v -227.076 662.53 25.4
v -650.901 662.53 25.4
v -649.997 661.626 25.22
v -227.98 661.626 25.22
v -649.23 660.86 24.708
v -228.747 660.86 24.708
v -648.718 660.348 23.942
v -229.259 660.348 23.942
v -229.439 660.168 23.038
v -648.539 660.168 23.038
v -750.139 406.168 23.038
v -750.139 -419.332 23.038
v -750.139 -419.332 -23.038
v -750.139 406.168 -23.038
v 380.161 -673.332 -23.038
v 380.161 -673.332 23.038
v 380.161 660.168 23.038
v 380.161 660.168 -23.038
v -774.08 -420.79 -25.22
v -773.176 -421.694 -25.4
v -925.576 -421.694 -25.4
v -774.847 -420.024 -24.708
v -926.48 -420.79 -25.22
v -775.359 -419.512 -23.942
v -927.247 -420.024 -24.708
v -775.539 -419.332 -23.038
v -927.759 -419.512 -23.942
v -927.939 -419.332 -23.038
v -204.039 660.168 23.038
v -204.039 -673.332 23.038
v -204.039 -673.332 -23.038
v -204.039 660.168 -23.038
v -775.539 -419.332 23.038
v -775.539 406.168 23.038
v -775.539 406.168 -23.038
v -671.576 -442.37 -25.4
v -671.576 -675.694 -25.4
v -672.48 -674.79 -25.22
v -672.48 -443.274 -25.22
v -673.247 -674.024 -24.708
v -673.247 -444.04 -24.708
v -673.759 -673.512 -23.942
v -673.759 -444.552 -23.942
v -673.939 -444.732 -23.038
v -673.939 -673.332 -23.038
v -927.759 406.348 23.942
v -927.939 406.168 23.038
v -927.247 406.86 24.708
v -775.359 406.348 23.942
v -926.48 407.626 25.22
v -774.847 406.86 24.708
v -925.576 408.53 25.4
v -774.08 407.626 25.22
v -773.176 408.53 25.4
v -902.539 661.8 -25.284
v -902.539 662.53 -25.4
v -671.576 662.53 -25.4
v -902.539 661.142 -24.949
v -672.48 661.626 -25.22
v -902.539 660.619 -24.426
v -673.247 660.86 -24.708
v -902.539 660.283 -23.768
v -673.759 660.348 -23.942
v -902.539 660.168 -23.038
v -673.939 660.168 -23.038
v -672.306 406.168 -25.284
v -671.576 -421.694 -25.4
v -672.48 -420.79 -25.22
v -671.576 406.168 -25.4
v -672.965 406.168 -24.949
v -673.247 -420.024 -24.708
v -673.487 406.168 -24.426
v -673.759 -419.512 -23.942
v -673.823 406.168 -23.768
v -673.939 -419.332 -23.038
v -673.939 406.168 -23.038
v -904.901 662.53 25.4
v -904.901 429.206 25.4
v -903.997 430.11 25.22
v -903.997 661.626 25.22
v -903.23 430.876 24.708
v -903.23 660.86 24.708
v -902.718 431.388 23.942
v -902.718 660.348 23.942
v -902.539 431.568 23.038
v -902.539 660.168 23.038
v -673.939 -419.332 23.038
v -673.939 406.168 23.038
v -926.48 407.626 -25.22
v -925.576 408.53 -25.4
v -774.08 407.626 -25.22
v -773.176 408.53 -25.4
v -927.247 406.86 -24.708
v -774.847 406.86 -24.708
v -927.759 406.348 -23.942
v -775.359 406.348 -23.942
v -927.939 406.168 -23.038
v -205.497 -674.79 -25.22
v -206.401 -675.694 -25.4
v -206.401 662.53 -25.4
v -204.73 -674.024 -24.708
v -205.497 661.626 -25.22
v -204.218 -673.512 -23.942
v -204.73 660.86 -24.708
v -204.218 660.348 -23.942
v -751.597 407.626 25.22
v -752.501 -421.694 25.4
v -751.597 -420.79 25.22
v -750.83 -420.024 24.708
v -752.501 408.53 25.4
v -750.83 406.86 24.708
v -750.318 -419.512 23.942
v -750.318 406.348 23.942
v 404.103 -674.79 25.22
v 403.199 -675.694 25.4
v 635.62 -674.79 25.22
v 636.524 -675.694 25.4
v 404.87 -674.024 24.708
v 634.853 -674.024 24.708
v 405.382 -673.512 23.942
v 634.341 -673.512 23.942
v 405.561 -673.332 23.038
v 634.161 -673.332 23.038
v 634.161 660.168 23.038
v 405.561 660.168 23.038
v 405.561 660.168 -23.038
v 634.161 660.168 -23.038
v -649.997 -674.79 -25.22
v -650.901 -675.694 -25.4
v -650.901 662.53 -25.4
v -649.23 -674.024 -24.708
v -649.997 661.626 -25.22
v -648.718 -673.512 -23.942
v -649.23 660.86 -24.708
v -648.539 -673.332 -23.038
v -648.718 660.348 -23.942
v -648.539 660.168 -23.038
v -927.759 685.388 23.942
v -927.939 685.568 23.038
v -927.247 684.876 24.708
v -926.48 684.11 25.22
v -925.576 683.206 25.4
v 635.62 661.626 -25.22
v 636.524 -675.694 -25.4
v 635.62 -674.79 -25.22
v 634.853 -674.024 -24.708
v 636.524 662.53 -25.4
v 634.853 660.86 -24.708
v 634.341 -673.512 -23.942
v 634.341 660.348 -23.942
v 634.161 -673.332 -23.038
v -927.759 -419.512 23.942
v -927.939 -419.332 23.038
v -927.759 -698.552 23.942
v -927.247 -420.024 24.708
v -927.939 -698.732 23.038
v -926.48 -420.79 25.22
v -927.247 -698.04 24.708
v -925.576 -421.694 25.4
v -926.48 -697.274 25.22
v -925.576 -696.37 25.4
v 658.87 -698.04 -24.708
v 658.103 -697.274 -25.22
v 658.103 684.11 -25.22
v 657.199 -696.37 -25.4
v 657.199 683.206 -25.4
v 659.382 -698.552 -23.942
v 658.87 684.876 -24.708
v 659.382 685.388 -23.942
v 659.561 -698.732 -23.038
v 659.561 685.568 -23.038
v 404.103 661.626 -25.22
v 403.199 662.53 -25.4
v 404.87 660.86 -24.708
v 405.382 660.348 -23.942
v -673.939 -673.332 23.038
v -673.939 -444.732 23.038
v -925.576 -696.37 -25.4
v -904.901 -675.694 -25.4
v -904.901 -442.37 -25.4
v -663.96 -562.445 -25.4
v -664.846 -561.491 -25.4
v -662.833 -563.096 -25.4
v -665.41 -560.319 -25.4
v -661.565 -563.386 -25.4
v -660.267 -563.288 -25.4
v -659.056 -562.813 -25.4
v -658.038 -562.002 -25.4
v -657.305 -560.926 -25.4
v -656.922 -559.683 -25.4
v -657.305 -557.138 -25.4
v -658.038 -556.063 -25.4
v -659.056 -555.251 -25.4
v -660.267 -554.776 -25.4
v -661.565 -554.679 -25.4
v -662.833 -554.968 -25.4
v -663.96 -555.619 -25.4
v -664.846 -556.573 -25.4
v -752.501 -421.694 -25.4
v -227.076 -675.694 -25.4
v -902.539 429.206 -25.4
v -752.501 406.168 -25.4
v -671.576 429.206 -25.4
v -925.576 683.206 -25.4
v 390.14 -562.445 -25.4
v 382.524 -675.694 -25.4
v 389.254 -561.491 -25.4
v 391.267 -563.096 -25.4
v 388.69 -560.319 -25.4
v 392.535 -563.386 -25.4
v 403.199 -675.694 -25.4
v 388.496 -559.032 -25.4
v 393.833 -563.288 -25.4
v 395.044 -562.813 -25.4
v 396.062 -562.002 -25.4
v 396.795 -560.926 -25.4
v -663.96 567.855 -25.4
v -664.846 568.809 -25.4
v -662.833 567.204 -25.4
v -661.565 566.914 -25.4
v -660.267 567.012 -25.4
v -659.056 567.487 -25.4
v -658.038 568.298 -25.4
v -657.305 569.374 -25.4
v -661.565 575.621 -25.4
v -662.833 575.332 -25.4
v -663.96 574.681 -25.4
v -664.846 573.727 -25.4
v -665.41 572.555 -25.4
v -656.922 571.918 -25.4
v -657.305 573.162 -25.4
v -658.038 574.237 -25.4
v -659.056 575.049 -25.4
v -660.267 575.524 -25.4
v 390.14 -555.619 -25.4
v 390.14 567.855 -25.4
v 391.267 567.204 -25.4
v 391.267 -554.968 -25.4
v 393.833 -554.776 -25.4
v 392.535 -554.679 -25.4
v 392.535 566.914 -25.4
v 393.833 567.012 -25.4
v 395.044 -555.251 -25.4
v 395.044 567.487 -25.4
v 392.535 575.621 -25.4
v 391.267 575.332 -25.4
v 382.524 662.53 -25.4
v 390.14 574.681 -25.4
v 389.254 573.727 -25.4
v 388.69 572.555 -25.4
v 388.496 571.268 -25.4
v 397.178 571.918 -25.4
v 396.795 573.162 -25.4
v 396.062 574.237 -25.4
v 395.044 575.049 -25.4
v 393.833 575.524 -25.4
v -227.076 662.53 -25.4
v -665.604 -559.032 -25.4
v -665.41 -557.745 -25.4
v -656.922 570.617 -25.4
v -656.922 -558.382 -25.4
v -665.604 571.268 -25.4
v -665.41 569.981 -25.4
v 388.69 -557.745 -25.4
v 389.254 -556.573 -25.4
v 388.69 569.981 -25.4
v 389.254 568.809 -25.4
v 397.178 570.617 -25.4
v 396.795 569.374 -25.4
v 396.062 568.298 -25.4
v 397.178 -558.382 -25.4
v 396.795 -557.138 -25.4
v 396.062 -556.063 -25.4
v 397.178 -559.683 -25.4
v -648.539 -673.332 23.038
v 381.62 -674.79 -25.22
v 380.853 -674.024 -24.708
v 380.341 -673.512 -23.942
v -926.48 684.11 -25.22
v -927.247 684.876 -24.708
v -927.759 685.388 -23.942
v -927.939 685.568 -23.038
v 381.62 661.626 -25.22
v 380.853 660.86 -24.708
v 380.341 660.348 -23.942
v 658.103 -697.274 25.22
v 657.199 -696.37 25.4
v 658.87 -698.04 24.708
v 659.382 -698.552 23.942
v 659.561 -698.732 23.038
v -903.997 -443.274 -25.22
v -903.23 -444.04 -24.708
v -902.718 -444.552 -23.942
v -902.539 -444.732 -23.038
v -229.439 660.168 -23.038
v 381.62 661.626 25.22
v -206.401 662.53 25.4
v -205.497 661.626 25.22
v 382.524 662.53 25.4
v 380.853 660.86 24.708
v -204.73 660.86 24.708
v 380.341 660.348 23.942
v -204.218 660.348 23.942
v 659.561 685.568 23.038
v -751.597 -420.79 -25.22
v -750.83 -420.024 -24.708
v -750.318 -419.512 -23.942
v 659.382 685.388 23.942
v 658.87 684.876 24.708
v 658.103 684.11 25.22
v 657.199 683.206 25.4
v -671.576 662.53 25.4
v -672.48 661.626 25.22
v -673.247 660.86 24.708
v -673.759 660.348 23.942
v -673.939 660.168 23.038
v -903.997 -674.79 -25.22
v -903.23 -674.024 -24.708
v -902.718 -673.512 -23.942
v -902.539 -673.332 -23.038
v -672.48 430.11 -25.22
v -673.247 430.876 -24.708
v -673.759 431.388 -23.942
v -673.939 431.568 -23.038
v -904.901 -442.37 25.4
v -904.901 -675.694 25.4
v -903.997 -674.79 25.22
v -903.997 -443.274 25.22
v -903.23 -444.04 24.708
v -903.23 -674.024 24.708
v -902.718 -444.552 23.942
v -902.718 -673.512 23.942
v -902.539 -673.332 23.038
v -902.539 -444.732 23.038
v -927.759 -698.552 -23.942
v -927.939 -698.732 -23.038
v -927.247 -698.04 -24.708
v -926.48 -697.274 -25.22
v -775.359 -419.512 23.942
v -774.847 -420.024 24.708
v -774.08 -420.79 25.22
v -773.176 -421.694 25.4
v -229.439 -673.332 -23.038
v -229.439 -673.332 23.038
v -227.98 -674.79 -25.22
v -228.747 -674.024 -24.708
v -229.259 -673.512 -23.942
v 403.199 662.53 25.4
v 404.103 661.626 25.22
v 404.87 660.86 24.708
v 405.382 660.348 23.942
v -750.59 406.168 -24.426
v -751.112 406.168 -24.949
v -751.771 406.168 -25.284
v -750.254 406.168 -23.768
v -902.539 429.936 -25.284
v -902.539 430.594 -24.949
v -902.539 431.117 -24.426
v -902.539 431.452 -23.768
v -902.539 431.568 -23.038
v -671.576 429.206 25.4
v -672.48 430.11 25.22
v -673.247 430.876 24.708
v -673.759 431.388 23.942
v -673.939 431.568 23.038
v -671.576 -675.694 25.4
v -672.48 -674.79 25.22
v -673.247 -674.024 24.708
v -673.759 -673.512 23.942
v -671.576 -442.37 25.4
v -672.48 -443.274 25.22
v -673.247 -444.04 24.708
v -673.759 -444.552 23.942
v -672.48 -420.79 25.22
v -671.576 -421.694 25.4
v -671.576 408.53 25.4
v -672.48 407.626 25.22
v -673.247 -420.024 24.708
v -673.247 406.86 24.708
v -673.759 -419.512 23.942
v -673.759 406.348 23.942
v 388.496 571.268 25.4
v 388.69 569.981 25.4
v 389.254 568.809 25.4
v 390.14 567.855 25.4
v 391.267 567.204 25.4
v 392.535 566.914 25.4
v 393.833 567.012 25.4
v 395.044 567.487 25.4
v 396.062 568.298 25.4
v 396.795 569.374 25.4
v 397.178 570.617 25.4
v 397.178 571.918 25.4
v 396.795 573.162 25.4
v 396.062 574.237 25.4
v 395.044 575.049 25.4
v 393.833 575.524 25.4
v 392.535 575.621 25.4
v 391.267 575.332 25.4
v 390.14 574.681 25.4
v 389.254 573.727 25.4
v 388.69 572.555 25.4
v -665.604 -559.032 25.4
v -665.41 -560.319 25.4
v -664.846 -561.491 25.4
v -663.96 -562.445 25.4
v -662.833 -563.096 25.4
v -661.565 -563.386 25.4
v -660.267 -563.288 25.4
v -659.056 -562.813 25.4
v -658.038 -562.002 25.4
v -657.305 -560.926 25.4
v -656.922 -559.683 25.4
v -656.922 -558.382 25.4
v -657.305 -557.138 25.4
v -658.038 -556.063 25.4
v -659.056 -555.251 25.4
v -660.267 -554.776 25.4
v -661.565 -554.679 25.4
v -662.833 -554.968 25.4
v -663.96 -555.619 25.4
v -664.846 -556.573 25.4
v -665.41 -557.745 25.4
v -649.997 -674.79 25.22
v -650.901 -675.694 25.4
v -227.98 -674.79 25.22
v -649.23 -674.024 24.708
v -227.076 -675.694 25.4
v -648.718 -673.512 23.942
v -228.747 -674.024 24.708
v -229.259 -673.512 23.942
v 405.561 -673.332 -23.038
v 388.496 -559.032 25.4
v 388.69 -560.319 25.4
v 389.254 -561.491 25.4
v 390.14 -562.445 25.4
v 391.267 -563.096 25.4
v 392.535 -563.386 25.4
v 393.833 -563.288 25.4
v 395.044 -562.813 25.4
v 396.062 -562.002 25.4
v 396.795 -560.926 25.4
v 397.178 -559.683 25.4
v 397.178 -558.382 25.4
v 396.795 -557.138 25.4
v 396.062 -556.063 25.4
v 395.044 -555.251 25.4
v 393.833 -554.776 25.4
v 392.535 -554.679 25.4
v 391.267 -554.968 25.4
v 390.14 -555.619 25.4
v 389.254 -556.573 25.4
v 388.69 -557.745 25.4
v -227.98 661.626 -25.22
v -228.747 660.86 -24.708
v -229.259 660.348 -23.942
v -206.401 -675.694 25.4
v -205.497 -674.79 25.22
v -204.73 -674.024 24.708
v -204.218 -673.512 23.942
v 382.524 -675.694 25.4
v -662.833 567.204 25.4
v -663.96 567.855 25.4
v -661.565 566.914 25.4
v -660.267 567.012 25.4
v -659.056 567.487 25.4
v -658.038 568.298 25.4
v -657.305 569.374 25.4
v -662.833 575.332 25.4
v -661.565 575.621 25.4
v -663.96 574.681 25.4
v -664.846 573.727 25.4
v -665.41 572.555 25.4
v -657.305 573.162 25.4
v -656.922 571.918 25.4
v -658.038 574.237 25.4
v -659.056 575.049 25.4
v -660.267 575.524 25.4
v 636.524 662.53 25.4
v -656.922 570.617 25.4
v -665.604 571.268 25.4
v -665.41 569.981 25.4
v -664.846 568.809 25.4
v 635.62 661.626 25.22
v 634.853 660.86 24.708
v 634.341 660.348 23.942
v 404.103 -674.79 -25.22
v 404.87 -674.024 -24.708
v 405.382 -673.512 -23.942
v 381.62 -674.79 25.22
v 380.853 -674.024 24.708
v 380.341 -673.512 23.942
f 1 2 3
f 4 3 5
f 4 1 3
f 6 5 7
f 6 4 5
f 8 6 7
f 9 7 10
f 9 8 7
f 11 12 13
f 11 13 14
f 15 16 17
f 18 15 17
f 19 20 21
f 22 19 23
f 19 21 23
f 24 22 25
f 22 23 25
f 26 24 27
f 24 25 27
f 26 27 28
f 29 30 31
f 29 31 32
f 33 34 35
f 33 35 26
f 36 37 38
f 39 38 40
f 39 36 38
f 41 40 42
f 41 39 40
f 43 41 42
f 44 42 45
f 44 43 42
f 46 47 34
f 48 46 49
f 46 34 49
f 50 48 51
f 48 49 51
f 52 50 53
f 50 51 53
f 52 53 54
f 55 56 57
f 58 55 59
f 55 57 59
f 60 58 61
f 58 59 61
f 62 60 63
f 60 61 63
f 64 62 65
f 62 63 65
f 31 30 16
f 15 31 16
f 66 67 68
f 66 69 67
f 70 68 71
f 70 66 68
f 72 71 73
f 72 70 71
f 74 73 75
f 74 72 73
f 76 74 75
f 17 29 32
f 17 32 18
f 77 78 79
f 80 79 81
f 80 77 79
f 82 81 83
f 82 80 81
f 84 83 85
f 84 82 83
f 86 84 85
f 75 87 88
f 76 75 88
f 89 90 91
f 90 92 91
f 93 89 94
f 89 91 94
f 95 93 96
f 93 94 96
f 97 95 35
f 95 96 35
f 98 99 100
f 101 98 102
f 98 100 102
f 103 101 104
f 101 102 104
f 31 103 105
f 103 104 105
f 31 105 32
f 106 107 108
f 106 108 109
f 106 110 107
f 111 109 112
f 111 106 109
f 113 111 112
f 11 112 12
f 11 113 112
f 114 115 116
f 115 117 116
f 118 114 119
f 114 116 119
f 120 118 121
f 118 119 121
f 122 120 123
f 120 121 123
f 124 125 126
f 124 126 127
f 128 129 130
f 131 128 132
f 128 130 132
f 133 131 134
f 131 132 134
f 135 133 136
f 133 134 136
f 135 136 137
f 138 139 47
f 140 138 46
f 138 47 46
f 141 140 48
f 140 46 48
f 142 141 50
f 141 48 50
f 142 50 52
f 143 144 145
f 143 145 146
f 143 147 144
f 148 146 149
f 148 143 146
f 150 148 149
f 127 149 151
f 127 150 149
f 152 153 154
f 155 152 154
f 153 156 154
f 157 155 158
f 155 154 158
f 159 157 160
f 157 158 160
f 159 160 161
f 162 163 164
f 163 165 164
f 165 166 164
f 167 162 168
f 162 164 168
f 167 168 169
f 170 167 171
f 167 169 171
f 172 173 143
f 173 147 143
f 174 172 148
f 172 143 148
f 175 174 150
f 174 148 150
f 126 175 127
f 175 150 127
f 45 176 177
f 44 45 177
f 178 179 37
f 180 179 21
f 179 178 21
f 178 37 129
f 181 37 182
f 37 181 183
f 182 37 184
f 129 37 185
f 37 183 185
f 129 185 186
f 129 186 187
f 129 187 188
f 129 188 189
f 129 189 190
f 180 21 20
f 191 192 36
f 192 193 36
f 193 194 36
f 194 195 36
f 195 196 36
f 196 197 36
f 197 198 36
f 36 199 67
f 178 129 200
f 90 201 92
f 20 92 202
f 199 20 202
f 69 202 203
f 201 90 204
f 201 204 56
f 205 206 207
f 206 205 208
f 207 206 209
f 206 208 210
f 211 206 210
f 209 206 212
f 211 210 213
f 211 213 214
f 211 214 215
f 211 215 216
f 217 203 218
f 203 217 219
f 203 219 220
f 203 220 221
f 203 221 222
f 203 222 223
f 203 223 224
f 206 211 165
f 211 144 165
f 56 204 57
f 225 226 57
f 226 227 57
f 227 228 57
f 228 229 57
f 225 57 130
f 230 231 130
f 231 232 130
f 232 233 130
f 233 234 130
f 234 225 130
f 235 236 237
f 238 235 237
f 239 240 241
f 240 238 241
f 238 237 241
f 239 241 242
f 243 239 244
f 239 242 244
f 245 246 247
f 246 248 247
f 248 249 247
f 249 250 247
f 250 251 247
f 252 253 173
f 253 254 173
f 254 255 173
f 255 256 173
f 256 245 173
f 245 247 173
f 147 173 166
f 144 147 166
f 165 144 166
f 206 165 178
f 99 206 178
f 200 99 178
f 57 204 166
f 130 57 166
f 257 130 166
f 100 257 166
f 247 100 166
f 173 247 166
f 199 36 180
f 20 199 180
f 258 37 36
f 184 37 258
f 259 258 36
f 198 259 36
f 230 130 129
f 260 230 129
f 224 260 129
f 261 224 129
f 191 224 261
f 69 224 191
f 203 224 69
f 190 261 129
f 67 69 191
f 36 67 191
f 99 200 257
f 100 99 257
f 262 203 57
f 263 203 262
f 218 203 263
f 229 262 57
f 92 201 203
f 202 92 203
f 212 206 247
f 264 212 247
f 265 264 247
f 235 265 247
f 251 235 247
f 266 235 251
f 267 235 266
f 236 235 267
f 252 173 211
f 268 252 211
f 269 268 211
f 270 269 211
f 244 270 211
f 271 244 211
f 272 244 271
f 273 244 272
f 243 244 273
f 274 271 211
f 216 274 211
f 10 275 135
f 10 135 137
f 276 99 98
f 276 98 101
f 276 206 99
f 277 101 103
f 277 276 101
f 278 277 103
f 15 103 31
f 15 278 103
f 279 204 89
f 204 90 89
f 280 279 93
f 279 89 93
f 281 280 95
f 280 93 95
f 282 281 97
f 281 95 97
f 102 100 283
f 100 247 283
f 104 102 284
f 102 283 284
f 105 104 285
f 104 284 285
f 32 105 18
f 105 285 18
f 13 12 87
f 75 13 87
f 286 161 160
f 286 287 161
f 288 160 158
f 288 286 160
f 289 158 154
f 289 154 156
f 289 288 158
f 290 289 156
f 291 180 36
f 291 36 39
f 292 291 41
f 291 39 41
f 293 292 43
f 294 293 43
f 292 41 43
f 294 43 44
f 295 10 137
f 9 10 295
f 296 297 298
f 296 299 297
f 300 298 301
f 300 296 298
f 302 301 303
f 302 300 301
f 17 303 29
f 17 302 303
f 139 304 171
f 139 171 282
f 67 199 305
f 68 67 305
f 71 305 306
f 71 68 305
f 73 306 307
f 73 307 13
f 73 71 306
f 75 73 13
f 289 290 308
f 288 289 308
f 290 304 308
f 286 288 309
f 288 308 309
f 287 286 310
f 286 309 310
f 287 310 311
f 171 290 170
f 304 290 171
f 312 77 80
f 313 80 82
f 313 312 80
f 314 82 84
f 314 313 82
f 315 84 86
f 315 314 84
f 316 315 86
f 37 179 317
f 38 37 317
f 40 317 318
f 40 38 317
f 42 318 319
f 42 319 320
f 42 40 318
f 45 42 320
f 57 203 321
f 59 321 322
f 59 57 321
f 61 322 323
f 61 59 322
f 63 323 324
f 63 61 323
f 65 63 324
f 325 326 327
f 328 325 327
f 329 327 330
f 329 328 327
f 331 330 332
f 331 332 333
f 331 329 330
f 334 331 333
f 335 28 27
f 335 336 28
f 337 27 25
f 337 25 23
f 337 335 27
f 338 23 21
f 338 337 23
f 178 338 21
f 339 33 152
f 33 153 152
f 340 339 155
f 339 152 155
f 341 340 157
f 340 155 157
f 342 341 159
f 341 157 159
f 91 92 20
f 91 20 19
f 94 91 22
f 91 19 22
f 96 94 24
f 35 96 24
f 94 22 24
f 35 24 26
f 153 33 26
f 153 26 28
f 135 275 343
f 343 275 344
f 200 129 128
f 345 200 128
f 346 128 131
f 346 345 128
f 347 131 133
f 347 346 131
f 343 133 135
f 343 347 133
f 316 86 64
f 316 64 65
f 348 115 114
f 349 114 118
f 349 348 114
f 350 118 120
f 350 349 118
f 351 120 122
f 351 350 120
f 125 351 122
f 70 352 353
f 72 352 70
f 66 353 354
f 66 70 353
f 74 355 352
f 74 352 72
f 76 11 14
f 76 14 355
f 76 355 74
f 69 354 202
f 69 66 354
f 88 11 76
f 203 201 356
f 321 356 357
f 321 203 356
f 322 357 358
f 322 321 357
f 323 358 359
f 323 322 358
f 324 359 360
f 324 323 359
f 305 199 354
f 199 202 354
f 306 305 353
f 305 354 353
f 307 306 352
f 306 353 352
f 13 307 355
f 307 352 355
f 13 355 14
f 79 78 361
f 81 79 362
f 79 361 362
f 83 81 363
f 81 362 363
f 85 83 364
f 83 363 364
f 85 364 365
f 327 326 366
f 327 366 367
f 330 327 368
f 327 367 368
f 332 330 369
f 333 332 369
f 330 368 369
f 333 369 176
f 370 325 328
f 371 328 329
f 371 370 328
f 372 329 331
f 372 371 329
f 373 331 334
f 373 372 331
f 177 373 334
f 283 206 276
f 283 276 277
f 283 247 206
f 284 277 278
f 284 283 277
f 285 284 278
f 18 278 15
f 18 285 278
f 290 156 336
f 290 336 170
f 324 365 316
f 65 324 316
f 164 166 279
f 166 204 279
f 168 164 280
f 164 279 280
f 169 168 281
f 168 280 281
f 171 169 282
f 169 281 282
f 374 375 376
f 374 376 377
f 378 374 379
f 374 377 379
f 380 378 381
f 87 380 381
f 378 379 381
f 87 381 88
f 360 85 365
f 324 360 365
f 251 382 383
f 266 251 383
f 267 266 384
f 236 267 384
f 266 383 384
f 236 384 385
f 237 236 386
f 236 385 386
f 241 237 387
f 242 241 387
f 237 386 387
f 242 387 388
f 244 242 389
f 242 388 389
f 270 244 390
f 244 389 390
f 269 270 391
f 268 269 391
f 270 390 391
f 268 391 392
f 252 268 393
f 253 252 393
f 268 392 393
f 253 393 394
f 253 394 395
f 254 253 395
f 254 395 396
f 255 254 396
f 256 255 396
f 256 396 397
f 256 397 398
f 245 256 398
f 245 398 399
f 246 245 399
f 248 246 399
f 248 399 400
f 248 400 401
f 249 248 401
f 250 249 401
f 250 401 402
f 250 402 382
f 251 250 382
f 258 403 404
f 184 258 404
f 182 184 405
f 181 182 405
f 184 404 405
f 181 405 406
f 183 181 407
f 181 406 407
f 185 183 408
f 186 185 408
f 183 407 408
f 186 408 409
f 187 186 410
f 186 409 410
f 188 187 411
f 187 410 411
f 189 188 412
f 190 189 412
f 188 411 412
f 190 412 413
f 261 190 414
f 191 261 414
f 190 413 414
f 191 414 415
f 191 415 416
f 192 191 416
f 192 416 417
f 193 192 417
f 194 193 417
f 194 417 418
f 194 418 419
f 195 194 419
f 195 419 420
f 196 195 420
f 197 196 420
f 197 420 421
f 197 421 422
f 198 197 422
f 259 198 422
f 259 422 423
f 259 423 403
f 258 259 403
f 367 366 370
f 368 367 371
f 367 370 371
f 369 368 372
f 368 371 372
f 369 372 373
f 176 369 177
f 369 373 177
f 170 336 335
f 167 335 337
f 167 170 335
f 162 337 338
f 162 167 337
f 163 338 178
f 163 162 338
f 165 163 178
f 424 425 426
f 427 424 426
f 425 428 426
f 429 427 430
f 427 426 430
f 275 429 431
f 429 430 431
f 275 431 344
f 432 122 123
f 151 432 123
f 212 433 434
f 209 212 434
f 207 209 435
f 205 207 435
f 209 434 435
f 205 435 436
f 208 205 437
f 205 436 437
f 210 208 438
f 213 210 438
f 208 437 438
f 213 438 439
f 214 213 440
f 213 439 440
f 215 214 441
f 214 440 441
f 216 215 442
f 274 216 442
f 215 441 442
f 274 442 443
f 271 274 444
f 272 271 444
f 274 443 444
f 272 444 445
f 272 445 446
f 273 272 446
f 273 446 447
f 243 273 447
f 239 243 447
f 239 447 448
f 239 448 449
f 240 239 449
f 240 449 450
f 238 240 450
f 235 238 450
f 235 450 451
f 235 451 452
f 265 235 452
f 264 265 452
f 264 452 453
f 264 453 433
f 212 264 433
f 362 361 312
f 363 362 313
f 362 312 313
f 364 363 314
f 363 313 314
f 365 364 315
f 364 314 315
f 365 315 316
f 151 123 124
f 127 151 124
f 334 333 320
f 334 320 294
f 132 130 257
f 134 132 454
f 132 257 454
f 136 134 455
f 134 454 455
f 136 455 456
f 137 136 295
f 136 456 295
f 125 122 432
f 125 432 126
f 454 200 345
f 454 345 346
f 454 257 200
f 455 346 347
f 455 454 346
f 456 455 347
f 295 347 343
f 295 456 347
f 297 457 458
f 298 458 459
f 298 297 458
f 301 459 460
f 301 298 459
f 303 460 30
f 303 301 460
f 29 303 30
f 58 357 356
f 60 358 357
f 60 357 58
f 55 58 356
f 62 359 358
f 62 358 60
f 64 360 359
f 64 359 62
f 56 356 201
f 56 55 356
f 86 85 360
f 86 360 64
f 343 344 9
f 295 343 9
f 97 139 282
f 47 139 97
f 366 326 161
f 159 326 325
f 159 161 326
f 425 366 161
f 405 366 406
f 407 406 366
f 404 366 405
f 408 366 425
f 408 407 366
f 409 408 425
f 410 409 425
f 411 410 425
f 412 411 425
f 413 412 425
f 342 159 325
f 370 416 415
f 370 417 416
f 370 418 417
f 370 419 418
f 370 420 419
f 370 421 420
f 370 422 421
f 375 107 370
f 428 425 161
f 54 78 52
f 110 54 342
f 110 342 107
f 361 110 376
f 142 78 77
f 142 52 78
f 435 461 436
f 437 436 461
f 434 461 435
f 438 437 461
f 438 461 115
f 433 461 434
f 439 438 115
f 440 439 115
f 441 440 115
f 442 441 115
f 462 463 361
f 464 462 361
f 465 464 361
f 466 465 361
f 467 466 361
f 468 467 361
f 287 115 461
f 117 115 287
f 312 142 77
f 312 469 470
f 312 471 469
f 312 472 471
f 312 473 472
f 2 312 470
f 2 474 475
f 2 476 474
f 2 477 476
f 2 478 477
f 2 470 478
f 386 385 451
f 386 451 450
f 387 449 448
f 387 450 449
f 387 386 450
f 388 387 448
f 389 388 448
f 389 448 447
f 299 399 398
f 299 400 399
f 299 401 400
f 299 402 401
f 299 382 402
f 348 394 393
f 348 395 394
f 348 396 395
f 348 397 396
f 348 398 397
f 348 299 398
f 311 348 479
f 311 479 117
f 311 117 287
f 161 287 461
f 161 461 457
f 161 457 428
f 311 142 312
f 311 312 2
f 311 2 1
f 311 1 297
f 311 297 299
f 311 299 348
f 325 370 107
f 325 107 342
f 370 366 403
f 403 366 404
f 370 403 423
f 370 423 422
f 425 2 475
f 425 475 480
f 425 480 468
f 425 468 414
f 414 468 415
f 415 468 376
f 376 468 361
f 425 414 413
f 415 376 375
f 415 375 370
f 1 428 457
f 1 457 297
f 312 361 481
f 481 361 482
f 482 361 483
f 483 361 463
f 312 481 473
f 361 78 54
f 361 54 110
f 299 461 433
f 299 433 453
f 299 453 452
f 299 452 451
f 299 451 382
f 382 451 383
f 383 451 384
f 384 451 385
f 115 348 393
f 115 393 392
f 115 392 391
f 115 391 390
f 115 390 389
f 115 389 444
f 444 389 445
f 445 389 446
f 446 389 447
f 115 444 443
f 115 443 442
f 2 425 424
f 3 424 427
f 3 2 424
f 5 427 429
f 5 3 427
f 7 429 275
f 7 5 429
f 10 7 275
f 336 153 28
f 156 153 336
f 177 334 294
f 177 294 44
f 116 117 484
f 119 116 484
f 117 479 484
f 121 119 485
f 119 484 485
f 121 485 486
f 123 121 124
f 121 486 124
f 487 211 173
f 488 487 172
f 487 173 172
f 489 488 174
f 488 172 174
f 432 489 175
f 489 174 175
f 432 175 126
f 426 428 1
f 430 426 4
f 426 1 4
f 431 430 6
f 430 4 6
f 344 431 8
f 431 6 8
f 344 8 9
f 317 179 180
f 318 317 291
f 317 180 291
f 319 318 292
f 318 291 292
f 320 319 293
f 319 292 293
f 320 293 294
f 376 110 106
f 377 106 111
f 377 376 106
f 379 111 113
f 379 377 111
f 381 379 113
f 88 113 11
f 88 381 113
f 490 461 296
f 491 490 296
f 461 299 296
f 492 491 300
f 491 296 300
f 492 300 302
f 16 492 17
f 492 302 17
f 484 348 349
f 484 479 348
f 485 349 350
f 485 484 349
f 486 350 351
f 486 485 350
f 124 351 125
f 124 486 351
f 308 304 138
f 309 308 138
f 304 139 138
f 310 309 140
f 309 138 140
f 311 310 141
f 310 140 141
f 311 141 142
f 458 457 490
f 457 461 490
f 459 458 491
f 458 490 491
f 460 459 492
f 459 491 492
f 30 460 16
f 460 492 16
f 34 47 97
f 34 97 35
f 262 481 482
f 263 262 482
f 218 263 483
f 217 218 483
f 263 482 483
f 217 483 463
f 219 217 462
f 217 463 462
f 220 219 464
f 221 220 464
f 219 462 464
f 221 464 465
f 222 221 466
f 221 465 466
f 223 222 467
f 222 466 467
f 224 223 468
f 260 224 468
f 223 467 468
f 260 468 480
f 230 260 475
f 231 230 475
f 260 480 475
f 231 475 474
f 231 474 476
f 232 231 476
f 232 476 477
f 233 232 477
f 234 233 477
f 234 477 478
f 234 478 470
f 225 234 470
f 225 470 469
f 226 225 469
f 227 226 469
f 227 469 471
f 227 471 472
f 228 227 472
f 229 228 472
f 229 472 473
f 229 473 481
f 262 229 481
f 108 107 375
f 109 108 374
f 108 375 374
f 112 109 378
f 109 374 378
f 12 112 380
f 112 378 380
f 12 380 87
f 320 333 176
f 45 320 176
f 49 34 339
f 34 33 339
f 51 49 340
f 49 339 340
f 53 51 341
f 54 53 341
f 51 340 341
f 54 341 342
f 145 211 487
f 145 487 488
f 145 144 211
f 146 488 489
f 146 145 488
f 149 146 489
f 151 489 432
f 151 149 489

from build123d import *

# Parameters (mm, degrees)
F0_W     = 228.6
F0_H     = 228.6
F0_W_2   = 76.2
F0_H_2   = 825.5
F0_W_3   = 419.1
F0_H_3   = 1333.5
F0_W_4   = 584.2
F1_DEPTH = 25.4
F2_R     = 2.3622
F3_R     = 2.3622
F5_D     = 8.73125


with BuildPart() as f1:
    # F0 (on Top) → F1 (new body, symmetric)
    with BuildSketch(Plane.XY):
        Polygon((-927.9385305348, -419.3321948051), (-927.9385305348, -698.7321948051), (659.5614694652, -698.7321948051), (659.5614694652, 685.5678051949), (-927.9385305348, 685.5678051949), (-927.9385305348, 406.1678051949), (-775.5385305348, 406.1678051949), (-775.5385305348, -419.3321948051), align=None)
        with Locations((-788.2385305348, -559.0321948051)):
            Rectangle(F0_W, F0_H, mode=Mode.SUBTRACT)
        with Locations((-712.0385305348, -6.5821948051)):
            Rectangle(F0_W_2, F0_H_2, mode=Mode.SUBTRACT)
        with Locations((-438.9885305348, -6.5821948051)):
            Rectangle(F0_W_3, F0_H_3, mode=Mode.SUBTRACT)
        with Locations((-788.2385305348, 545.8678051949)):
            Rectangle(F0_W, F0_H, mode=Mode.SUBTRACT)
        with Locations((88.0614694652, -6.5821948051)):
            Rectangle(F0_W_4, F0_H_3, mode=Mode.SUBTRACT)
        with Locations((519.8614694652, -6.5821948051)):
            Rectangle(F0_W, F0_H_3, mode=Mode.SUBTRACT)
    extrude(amount=F1_DEPTH, both=True)

    # F2
    f2_edges = [f1.edges().sort_by_distance(p)[0] for p in [
        (-927.938531, 545.867805, 25.4),
        (-851.738531, 406.167805, 25.4),
        (-775.538531, -6.582195, 25.4),
        (-134.188531, 685.567805, 25.4),
        (659.561469, -6.582195, 25.4),
        (-134.188531, -698.732195, 25.4),
        (-927.938531, -559.032195, 25.4),
        (-851.738531, -419.332195, 25.4),
        (-712.038531, -419.332195, 25.4),
        (-750.138531, -6.582195, 25.4),
        (-788.238531, -444.732195, 25.4),
        (-673.938531, -559.032195, 25.4),
        (-902.538531, -559.032195, 25.4),
        (-788.238531, -673.332195, 25.4),
        (-438.988531, -673.332195, 25.4),
        (-648.538531, -6.582195, 25.4),
        (-229.438531, -6.582195, 25.4),
        (88.061469, -673.332195, 25.4),
        (380.161469, -6.582195, 25.4),
        (519.861469, -673.332195, 25.4),
        (634.161469, -6.582195, 25.4),
        (-204.038531, -6.582195, 25.4),
        (405.561469, -6.582195, 25.4),
        (-902.538531, 545.867805, 25.4),
        (-788.238531, 431.567805, 25.4),
        (-788.238531, 660.167805, 25.4),
        (-438.988531, 660.167805, 25.4),
        (-712.038531, 406.167805, 25.4),
        (-673.938531, -6.582195, 25.4),
        (-673.938531, 545.867805, 25.4),
        (88.061469, 660.167805, 25.4),
        (519.861469, 660.167805, 25.4),
    ]]
    fillet(f2_edges, radius=F2_R)

    # F3
    f3_edges = [f1.edges().sort_by_distance(p)[0] for p in [
        (-927.938531, -559.032195, -25.4),
        (-851.738531, -419.332195, -25.4),
        (-902.538531, -559.032195, -25.4),
        (-673.938531, -559.032195, -25.4),
        (-788.238531, -673.332195, -25.4),
        (-134.188531, -698.732195, -25.4),
        (-438.988531, -673.332195, -25.4),
        (-648.538531, -6.582195, -25.4),
        (-229.438531, -6.582195, -25.4),
        (-204.038531, -6.582195, -25.4),
        (-788.238531, -444.732195, -25.4),
        (88.061469, -673.332195, -25.4),
        (380.161469, -6.582195, -25.4),
        (405.561469, -6.582195, -25.4),
        (519.861469, -673.332195, -25.4),
        (634.161469, -6.582195, -25.4),
        (519.861469, 660.167805, -25.4),
        (88.061469, 660.167805, -25.4),
        (-438.988531, 660.167805, -25.4),
        (-788.238531, 660.167805, -25.4),
        (-927.938531, 545.867805, -25.4),
        (-851.738531, 406.167805, -25.4),
        (-788.238531, 431.567805, -25.4),
        (-673.938531, 545.867805, -25.4),
        (-673.938531, -6.582195, -25.4),
        (-775.538531, -6.582195, -25.4),
        (-750.138531, -6.582195, -25.4),
        (659.561469, -6.582195, -25.4),
        (-712.038531, -419.332195, -25.4),
        (-134.188531, 685.567805, -25.4),
    ]]
    fillet(f3_edges, radius=F3_R)

    # F5 (through all)
    with Locations(Plane(origin=(0, 0, -25.4), x_dir=(1, 0, 0), z_dir=(0, 0, -1))):
        with Locations((-661.2385305348, -571.2678051949), (-661.2385305348, 559.0321948051), (392.8614694652, 559.0321948051), (392.8614694652, -571.2678051949)):
            Hole(F5_D / 2)


solid = f1.part
